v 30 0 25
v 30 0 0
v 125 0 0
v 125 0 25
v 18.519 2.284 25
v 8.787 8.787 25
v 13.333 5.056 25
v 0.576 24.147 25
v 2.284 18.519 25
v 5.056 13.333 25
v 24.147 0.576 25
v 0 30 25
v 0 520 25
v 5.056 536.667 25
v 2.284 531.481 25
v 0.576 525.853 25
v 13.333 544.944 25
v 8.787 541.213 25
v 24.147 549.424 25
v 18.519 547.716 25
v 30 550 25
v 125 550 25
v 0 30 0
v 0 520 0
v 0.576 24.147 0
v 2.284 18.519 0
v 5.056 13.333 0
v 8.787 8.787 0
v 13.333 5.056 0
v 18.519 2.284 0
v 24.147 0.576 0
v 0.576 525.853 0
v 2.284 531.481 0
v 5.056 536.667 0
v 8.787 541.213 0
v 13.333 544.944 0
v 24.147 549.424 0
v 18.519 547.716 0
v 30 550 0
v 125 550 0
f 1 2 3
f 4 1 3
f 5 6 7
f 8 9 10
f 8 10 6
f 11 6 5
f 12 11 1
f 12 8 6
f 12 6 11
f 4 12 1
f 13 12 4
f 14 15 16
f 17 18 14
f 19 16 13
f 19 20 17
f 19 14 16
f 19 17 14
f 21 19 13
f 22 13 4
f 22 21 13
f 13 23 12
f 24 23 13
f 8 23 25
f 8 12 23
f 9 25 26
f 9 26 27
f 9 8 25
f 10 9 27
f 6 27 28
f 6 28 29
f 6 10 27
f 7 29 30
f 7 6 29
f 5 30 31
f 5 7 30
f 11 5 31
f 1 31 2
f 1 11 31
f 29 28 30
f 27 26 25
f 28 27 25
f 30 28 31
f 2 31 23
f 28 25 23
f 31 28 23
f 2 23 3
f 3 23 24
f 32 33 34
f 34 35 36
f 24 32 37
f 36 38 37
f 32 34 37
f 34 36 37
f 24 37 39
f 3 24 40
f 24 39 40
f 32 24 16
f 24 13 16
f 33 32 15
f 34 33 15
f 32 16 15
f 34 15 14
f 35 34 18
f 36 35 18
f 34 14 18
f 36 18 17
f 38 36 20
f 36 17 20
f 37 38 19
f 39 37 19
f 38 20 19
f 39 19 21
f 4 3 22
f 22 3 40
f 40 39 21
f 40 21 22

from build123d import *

# Parameters (mm, degrees)
SKETCH1_W           = 125
SKETCH1_H           = 550
BOSS_EXTRUDE1_DEPTH = 25
FILLET4_R           = 30
FILLET5_R           = 30


with BuildPart() as part:
    # Sketch1 → Boss-Extrude1 (new body)
    with BuildSketch(Plane.XY):
        with Locations((62.5, 275)):
            Rectangle(SKETCH1_W, SKETCH1_H)
    extrude(amount=BOSS_EXTRUDE1_DEPTH)

    # Fillet4
    fillet4_edges = [part.edges().sort_by_distance(p)[0] for p in [
        (0, 550, 12.5),
    ]]
    fillet(fillet4_edges, radius=FILLET4_R)

    # Fillet5
    fillet5_edges = [part.edges().sort_by_distance(p)[0] for p in [
        (0, 0, 12.5),
    ]]
    fillet(fillet5_edges, radius=FILLET5_R)


solid = part.part
